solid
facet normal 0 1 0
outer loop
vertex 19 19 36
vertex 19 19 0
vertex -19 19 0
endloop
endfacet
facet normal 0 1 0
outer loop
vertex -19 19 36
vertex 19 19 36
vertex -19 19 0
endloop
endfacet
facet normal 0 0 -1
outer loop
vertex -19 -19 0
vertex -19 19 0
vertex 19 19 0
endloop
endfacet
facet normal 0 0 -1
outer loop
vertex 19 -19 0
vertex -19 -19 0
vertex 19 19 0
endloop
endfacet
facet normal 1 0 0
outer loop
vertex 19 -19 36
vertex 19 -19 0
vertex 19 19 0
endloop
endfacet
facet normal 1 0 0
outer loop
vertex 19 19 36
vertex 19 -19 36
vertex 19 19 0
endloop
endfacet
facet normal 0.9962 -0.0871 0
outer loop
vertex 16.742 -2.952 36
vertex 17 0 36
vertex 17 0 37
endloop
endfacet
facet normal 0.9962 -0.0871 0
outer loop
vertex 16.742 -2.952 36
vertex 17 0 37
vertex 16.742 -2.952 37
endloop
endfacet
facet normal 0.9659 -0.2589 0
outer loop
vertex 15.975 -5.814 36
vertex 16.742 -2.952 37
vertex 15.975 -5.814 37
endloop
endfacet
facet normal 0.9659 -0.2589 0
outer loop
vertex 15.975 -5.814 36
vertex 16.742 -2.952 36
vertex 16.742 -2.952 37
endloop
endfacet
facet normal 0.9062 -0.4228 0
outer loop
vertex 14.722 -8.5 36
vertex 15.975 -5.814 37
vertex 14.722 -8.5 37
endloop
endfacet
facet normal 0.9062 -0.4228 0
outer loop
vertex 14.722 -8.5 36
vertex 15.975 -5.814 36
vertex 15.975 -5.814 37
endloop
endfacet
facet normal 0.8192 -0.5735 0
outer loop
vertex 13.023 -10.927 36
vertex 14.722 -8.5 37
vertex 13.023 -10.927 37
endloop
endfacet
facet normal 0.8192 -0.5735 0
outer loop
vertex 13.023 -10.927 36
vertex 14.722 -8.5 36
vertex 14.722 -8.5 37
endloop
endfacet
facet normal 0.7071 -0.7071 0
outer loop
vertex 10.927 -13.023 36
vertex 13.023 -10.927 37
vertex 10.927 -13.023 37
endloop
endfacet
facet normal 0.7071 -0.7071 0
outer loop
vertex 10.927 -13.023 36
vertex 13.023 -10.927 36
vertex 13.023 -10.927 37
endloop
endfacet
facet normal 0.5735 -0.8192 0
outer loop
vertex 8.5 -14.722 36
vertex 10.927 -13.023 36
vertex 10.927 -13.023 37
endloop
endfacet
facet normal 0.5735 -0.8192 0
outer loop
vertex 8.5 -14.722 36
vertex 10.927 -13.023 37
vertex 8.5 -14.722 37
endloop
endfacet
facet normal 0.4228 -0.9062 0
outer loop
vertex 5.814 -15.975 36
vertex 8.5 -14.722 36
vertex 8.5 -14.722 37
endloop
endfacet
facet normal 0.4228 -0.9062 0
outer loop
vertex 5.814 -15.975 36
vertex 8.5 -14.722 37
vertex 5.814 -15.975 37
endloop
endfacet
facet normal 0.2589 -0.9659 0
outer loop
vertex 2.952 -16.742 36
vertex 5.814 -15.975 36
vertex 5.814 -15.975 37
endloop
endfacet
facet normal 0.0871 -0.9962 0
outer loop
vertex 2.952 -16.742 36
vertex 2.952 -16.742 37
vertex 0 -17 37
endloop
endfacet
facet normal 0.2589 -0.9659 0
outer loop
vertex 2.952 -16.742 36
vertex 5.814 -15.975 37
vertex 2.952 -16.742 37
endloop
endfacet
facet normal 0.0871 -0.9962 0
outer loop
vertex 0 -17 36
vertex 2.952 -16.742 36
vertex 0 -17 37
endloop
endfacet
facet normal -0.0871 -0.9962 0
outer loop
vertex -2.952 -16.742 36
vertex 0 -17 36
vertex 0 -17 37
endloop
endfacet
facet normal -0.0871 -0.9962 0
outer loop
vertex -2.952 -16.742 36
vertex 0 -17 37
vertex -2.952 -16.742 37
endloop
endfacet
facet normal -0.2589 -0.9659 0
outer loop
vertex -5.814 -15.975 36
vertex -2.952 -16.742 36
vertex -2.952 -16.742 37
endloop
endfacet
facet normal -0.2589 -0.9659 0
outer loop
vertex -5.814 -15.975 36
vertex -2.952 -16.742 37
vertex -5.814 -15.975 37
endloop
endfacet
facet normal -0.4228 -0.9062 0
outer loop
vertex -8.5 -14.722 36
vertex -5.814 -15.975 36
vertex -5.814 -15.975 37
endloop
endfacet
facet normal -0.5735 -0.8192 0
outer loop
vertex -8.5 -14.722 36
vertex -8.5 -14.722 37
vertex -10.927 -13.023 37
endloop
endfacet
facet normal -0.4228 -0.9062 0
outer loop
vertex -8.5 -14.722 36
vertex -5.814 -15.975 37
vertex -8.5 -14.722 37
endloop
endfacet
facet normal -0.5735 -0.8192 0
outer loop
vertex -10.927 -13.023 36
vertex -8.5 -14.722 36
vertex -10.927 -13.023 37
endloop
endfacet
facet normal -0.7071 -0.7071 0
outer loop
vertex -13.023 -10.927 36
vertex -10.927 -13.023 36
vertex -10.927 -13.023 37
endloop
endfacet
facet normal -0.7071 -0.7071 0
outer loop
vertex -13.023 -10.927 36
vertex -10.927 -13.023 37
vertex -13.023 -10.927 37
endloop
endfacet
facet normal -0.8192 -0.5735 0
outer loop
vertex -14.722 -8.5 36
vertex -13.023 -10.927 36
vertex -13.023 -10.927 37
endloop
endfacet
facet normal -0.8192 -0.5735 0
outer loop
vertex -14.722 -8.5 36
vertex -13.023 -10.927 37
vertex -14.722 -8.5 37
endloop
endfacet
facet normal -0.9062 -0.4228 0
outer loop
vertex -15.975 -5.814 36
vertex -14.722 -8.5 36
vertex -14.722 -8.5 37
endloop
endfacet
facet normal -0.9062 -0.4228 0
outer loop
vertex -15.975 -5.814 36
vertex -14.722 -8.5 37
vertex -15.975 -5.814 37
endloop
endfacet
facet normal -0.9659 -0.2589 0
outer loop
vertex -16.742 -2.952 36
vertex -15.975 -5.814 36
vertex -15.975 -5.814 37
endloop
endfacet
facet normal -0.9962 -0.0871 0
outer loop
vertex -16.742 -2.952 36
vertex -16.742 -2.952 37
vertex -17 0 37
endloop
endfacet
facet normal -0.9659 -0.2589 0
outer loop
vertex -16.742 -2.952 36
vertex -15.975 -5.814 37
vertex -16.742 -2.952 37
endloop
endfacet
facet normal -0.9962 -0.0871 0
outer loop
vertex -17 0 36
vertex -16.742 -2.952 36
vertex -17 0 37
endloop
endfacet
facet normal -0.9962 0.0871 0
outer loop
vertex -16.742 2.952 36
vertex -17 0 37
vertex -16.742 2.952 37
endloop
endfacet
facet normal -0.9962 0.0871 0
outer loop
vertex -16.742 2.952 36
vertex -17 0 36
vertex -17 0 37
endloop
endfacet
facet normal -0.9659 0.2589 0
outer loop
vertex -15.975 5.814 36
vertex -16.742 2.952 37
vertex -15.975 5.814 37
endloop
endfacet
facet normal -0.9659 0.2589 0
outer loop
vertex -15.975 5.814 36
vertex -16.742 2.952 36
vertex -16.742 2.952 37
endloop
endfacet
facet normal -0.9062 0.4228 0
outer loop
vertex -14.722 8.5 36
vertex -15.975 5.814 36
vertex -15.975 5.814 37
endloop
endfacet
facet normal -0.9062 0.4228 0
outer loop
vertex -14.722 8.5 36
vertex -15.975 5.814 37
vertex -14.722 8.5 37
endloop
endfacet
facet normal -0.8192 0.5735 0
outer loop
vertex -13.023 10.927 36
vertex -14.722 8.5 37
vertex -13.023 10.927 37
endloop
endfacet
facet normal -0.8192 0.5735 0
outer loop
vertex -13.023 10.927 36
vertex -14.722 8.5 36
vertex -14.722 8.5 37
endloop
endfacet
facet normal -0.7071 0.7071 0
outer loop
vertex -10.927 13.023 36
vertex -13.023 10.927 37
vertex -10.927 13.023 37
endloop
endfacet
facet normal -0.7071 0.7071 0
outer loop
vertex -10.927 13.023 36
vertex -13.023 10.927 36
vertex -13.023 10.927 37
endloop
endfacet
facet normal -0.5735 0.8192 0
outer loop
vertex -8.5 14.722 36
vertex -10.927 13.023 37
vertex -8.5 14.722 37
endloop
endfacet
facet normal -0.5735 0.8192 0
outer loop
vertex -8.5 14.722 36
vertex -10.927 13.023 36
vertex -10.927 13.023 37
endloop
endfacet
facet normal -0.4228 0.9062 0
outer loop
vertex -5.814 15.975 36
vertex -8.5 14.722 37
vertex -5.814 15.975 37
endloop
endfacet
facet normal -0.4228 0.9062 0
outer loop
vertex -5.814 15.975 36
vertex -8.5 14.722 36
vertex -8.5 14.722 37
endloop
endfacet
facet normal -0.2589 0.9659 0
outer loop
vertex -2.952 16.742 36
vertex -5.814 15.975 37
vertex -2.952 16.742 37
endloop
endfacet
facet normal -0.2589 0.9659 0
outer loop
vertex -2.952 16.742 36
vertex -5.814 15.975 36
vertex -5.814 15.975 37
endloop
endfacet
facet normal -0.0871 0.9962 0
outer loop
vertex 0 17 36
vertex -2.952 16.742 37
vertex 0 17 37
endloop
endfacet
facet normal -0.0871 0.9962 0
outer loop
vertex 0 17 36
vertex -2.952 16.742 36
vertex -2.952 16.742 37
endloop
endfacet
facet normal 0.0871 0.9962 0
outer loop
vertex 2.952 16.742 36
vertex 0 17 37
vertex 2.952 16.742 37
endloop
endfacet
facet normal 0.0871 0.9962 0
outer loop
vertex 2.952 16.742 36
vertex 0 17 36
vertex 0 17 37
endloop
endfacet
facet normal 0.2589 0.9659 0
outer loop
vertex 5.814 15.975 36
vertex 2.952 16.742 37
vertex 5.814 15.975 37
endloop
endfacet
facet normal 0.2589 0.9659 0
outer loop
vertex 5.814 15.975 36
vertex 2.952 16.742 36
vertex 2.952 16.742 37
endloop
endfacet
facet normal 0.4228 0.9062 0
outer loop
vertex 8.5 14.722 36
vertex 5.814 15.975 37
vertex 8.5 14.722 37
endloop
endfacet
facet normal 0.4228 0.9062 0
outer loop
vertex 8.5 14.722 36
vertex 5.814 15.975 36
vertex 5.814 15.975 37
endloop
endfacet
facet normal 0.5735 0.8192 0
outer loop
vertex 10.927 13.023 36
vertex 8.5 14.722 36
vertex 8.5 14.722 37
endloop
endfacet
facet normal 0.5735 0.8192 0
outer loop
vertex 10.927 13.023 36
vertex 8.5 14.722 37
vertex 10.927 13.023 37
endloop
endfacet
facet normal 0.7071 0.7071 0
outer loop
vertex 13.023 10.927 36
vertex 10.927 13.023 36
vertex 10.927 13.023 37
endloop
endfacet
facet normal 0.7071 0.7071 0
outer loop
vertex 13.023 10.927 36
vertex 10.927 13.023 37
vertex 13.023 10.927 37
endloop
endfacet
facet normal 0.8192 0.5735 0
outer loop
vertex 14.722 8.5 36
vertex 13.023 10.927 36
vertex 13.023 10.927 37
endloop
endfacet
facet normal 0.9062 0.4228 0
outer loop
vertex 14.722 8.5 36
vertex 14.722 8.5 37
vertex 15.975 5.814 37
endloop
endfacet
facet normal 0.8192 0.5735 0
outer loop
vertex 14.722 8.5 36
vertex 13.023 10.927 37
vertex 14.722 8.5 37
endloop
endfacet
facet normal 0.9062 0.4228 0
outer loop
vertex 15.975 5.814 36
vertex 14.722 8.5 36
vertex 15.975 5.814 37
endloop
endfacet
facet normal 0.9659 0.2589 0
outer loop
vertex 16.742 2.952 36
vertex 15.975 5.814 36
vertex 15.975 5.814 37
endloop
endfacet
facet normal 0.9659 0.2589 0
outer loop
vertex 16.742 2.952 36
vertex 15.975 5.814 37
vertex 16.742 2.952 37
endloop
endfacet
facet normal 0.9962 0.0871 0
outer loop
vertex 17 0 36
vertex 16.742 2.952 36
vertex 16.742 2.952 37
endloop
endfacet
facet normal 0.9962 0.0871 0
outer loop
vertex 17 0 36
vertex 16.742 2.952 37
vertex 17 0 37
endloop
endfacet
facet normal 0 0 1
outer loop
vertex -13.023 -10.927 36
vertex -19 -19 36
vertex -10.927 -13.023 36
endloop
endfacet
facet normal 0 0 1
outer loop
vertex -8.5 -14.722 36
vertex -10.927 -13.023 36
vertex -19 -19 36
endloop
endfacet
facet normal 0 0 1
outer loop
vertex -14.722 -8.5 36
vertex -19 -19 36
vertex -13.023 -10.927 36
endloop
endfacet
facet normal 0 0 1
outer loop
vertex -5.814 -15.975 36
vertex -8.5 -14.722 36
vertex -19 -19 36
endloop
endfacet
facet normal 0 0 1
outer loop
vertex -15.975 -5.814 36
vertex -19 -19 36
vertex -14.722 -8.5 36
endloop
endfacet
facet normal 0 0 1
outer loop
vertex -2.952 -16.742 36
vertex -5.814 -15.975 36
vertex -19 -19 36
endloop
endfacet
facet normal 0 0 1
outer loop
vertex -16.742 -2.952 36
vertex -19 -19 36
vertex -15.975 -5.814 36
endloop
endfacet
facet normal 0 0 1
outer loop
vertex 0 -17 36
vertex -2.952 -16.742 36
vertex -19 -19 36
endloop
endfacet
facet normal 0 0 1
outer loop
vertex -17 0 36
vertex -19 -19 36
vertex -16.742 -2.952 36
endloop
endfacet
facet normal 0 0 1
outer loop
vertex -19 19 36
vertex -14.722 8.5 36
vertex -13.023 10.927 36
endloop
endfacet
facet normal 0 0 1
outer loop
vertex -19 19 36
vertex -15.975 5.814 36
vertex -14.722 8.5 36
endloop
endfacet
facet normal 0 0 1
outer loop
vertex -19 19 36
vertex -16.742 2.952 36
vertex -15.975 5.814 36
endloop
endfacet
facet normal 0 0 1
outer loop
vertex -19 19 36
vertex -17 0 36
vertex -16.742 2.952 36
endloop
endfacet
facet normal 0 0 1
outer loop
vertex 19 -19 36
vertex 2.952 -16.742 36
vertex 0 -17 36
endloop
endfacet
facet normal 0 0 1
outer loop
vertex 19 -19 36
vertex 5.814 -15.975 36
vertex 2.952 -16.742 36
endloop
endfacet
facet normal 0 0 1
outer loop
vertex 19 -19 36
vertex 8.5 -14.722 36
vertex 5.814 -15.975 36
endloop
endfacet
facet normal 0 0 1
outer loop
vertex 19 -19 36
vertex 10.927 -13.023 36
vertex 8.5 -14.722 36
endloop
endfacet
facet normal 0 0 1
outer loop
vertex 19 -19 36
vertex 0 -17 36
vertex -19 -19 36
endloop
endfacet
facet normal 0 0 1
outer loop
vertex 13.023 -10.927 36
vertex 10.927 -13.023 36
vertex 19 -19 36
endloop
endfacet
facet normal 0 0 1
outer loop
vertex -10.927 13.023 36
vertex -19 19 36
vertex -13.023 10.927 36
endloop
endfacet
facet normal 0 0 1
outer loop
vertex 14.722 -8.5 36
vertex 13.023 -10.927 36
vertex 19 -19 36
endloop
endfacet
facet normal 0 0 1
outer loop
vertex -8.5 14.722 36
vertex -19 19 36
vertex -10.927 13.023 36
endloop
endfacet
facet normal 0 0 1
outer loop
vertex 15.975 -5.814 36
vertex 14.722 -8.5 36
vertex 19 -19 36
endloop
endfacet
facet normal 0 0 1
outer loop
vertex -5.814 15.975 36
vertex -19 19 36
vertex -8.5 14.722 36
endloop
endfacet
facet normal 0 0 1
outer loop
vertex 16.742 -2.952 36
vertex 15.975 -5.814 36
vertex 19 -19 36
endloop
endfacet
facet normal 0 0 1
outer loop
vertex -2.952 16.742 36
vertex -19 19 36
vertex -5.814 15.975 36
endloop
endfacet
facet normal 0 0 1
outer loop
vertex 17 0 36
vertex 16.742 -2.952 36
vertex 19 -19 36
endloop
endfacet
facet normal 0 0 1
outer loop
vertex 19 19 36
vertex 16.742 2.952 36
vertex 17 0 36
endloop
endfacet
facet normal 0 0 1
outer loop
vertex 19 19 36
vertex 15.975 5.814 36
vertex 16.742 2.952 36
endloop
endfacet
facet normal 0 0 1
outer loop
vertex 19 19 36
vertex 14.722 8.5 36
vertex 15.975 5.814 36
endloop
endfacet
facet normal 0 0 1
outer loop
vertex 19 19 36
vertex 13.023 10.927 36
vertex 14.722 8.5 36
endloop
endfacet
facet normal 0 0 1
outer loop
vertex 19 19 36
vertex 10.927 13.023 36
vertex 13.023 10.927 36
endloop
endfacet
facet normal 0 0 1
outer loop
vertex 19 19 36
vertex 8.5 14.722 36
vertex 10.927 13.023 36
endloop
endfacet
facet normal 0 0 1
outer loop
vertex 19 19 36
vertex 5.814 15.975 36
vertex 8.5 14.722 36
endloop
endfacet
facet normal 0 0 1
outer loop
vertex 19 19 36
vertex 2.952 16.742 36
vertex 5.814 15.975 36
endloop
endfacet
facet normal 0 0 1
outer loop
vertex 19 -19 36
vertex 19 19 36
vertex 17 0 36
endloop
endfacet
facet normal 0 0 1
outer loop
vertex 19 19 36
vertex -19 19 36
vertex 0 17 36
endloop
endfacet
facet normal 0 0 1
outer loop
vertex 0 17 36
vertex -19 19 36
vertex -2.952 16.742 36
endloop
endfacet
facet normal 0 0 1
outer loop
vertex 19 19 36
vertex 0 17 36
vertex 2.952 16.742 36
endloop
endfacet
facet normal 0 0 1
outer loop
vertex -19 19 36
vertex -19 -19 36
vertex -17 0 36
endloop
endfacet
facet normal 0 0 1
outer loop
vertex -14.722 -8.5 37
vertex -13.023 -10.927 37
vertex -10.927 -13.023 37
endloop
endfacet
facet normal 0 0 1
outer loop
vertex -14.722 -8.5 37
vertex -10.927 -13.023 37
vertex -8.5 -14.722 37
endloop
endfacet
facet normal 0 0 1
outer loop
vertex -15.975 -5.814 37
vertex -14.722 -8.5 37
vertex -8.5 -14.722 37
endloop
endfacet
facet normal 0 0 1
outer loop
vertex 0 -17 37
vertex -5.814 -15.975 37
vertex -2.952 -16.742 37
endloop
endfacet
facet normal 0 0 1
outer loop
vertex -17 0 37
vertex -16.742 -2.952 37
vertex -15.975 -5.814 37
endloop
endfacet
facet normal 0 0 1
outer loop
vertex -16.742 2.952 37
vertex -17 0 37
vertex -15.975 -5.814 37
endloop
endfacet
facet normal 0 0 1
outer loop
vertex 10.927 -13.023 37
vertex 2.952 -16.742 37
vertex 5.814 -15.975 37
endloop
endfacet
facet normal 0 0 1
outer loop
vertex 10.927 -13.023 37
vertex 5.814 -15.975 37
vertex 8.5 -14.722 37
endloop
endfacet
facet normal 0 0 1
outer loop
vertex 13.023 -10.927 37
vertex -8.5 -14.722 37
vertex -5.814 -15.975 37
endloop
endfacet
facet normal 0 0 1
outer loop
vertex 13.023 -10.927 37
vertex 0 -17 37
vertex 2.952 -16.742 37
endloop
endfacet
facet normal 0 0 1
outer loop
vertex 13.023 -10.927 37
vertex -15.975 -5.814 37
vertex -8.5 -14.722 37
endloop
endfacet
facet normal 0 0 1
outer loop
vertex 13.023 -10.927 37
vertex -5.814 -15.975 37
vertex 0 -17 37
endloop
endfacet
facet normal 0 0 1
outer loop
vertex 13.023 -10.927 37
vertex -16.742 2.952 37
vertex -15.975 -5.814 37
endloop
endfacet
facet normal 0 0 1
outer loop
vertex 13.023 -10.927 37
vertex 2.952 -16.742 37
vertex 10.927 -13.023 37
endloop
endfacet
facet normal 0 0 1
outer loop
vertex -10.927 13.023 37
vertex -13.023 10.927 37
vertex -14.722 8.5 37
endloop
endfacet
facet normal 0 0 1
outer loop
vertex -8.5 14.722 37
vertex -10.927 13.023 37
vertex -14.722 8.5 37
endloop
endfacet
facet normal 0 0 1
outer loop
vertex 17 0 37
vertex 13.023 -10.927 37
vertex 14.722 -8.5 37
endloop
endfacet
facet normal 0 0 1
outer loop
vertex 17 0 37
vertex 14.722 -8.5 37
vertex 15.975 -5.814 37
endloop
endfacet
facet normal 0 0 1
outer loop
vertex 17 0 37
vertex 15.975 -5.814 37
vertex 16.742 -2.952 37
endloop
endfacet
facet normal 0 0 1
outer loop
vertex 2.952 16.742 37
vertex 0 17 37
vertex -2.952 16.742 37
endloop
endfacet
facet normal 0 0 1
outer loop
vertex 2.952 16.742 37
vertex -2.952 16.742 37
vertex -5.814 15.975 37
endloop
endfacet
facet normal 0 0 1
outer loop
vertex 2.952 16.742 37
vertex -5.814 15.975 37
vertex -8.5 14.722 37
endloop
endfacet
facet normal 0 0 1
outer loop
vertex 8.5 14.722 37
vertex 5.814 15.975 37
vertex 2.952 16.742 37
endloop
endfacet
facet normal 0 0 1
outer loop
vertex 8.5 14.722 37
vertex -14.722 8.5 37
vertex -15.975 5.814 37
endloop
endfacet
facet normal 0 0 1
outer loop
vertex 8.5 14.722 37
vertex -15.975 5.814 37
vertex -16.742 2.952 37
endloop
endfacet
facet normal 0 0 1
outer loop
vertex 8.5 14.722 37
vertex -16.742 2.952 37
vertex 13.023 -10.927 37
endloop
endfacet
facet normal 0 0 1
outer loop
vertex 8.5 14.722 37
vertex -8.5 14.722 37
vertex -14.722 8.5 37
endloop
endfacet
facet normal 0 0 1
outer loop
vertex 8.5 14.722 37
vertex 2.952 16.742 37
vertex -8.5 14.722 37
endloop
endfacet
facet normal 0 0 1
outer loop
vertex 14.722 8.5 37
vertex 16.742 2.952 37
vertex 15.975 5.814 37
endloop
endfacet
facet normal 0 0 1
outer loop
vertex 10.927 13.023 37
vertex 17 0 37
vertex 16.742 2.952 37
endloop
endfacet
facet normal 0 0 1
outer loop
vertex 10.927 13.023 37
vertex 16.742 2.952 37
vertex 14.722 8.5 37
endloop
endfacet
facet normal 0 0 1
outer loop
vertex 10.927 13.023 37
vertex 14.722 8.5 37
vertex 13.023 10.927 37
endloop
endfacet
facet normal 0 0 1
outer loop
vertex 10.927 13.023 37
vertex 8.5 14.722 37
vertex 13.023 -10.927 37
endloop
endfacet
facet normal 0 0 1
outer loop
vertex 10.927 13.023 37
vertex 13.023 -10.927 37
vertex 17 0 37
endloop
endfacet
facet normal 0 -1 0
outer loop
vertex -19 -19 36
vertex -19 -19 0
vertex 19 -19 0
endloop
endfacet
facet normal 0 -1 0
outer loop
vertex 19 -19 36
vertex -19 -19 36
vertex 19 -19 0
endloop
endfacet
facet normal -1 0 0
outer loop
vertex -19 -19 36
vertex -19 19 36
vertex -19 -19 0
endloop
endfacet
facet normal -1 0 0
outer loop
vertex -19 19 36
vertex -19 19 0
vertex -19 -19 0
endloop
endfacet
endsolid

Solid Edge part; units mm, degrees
sketch "Sketch1" plane through (0, 0, 0) normal (0, 0, 1) x (1, 0, 0)
  line L0 (-19, -19) -> (19, -19)
  line L1 (19, -19) -> (19, 19)
  line L2 (19, 19) -> (-19, 19)
  line L3 (-19, 19) -> (-19, -19)
extrude "Protrusion1" add sketch "Sketch1" along normal blind 36
sketch "Sketch2" plane through (0, 0, 36) normal (0, 0, 1) x (1, 0, 0)
  circle A0 centre (0, 0) radius 17
extrude "ExtrudedProtrusion_2" add sketch "Sketch2" along normal blind 1
